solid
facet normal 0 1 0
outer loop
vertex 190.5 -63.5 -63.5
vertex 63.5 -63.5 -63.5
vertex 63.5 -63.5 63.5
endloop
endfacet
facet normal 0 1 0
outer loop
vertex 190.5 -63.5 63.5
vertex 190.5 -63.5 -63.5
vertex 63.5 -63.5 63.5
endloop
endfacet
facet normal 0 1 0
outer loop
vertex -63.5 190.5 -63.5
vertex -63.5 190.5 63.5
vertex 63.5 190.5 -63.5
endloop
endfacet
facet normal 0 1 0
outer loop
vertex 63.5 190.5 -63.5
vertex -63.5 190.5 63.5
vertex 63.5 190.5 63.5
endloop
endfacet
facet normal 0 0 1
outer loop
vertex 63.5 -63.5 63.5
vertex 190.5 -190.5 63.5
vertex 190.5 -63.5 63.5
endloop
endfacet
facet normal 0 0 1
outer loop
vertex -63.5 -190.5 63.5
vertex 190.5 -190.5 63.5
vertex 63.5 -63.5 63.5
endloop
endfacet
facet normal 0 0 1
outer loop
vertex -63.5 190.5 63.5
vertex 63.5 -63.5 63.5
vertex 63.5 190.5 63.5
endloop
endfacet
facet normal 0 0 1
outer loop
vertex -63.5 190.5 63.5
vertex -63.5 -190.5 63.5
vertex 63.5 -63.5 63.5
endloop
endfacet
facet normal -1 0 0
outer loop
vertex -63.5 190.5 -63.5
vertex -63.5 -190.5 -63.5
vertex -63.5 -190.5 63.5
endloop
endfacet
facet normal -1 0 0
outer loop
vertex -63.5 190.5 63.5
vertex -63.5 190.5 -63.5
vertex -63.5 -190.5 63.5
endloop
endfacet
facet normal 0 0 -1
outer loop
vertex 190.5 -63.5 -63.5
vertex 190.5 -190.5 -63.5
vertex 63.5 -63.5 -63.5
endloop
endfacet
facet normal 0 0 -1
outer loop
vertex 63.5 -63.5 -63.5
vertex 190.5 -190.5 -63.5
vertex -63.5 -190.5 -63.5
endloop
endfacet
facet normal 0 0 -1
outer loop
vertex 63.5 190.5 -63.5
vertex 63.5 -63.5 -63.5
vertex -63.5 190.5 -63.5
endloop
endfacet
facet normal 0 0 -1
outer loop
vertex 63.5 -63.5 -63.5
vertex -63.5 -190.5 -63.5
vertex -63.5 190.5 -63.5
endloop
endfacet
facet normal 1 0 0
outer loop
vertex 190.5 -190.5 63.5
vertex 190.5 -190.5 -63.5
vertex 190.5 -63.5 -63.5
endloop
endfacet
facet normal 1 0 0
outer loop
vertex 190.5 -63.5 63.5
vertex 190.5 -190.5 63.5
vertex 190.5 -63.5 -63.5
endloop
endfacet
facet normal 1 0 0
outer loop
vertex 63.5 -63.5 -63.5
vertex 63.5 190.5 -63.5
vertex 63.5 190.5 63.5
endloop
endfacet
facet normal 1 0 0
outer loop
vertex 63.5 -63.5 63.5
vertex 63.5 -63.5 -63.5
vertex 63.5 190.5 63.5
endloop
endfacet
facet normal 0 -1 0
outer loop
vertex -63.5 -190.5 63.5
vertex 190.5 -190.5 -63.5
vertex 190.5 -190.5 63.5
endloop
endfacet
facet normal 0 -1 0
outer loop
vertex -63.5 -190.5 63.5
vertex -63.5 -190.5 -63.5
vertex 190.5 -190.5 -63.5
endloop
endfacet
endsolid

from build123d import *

# Parameters (mm, degrees)
F1_W     = 127
F1_H     = 127
F2_DEPTH = 190.5
F3_W     = 127
F3_H     = 127
F4_DEPTH = 127


# Not quite as in the source:
# - a variable given as a bare number and used for a length is read in inches; the dataset says mm whatever the document's units were


with BuildPart() as f2:
    # F1 (on Front) → F2 (new body, symmetric)
    with BuildSketch(Plane.XZ):
        Rectangle(F1_W, F1_H)
    extrude(amount=F2_DEPTH, both=True)

    # F3 (on face) → F4 (join)
    with BuildSketch(Plane.YZ.offset(63.5)):
        with Locations((-127, 0)):
            Rectangle(F3_W, F3_H)
    extrude(amount=F4_DEPTH)


solid = f2.part
